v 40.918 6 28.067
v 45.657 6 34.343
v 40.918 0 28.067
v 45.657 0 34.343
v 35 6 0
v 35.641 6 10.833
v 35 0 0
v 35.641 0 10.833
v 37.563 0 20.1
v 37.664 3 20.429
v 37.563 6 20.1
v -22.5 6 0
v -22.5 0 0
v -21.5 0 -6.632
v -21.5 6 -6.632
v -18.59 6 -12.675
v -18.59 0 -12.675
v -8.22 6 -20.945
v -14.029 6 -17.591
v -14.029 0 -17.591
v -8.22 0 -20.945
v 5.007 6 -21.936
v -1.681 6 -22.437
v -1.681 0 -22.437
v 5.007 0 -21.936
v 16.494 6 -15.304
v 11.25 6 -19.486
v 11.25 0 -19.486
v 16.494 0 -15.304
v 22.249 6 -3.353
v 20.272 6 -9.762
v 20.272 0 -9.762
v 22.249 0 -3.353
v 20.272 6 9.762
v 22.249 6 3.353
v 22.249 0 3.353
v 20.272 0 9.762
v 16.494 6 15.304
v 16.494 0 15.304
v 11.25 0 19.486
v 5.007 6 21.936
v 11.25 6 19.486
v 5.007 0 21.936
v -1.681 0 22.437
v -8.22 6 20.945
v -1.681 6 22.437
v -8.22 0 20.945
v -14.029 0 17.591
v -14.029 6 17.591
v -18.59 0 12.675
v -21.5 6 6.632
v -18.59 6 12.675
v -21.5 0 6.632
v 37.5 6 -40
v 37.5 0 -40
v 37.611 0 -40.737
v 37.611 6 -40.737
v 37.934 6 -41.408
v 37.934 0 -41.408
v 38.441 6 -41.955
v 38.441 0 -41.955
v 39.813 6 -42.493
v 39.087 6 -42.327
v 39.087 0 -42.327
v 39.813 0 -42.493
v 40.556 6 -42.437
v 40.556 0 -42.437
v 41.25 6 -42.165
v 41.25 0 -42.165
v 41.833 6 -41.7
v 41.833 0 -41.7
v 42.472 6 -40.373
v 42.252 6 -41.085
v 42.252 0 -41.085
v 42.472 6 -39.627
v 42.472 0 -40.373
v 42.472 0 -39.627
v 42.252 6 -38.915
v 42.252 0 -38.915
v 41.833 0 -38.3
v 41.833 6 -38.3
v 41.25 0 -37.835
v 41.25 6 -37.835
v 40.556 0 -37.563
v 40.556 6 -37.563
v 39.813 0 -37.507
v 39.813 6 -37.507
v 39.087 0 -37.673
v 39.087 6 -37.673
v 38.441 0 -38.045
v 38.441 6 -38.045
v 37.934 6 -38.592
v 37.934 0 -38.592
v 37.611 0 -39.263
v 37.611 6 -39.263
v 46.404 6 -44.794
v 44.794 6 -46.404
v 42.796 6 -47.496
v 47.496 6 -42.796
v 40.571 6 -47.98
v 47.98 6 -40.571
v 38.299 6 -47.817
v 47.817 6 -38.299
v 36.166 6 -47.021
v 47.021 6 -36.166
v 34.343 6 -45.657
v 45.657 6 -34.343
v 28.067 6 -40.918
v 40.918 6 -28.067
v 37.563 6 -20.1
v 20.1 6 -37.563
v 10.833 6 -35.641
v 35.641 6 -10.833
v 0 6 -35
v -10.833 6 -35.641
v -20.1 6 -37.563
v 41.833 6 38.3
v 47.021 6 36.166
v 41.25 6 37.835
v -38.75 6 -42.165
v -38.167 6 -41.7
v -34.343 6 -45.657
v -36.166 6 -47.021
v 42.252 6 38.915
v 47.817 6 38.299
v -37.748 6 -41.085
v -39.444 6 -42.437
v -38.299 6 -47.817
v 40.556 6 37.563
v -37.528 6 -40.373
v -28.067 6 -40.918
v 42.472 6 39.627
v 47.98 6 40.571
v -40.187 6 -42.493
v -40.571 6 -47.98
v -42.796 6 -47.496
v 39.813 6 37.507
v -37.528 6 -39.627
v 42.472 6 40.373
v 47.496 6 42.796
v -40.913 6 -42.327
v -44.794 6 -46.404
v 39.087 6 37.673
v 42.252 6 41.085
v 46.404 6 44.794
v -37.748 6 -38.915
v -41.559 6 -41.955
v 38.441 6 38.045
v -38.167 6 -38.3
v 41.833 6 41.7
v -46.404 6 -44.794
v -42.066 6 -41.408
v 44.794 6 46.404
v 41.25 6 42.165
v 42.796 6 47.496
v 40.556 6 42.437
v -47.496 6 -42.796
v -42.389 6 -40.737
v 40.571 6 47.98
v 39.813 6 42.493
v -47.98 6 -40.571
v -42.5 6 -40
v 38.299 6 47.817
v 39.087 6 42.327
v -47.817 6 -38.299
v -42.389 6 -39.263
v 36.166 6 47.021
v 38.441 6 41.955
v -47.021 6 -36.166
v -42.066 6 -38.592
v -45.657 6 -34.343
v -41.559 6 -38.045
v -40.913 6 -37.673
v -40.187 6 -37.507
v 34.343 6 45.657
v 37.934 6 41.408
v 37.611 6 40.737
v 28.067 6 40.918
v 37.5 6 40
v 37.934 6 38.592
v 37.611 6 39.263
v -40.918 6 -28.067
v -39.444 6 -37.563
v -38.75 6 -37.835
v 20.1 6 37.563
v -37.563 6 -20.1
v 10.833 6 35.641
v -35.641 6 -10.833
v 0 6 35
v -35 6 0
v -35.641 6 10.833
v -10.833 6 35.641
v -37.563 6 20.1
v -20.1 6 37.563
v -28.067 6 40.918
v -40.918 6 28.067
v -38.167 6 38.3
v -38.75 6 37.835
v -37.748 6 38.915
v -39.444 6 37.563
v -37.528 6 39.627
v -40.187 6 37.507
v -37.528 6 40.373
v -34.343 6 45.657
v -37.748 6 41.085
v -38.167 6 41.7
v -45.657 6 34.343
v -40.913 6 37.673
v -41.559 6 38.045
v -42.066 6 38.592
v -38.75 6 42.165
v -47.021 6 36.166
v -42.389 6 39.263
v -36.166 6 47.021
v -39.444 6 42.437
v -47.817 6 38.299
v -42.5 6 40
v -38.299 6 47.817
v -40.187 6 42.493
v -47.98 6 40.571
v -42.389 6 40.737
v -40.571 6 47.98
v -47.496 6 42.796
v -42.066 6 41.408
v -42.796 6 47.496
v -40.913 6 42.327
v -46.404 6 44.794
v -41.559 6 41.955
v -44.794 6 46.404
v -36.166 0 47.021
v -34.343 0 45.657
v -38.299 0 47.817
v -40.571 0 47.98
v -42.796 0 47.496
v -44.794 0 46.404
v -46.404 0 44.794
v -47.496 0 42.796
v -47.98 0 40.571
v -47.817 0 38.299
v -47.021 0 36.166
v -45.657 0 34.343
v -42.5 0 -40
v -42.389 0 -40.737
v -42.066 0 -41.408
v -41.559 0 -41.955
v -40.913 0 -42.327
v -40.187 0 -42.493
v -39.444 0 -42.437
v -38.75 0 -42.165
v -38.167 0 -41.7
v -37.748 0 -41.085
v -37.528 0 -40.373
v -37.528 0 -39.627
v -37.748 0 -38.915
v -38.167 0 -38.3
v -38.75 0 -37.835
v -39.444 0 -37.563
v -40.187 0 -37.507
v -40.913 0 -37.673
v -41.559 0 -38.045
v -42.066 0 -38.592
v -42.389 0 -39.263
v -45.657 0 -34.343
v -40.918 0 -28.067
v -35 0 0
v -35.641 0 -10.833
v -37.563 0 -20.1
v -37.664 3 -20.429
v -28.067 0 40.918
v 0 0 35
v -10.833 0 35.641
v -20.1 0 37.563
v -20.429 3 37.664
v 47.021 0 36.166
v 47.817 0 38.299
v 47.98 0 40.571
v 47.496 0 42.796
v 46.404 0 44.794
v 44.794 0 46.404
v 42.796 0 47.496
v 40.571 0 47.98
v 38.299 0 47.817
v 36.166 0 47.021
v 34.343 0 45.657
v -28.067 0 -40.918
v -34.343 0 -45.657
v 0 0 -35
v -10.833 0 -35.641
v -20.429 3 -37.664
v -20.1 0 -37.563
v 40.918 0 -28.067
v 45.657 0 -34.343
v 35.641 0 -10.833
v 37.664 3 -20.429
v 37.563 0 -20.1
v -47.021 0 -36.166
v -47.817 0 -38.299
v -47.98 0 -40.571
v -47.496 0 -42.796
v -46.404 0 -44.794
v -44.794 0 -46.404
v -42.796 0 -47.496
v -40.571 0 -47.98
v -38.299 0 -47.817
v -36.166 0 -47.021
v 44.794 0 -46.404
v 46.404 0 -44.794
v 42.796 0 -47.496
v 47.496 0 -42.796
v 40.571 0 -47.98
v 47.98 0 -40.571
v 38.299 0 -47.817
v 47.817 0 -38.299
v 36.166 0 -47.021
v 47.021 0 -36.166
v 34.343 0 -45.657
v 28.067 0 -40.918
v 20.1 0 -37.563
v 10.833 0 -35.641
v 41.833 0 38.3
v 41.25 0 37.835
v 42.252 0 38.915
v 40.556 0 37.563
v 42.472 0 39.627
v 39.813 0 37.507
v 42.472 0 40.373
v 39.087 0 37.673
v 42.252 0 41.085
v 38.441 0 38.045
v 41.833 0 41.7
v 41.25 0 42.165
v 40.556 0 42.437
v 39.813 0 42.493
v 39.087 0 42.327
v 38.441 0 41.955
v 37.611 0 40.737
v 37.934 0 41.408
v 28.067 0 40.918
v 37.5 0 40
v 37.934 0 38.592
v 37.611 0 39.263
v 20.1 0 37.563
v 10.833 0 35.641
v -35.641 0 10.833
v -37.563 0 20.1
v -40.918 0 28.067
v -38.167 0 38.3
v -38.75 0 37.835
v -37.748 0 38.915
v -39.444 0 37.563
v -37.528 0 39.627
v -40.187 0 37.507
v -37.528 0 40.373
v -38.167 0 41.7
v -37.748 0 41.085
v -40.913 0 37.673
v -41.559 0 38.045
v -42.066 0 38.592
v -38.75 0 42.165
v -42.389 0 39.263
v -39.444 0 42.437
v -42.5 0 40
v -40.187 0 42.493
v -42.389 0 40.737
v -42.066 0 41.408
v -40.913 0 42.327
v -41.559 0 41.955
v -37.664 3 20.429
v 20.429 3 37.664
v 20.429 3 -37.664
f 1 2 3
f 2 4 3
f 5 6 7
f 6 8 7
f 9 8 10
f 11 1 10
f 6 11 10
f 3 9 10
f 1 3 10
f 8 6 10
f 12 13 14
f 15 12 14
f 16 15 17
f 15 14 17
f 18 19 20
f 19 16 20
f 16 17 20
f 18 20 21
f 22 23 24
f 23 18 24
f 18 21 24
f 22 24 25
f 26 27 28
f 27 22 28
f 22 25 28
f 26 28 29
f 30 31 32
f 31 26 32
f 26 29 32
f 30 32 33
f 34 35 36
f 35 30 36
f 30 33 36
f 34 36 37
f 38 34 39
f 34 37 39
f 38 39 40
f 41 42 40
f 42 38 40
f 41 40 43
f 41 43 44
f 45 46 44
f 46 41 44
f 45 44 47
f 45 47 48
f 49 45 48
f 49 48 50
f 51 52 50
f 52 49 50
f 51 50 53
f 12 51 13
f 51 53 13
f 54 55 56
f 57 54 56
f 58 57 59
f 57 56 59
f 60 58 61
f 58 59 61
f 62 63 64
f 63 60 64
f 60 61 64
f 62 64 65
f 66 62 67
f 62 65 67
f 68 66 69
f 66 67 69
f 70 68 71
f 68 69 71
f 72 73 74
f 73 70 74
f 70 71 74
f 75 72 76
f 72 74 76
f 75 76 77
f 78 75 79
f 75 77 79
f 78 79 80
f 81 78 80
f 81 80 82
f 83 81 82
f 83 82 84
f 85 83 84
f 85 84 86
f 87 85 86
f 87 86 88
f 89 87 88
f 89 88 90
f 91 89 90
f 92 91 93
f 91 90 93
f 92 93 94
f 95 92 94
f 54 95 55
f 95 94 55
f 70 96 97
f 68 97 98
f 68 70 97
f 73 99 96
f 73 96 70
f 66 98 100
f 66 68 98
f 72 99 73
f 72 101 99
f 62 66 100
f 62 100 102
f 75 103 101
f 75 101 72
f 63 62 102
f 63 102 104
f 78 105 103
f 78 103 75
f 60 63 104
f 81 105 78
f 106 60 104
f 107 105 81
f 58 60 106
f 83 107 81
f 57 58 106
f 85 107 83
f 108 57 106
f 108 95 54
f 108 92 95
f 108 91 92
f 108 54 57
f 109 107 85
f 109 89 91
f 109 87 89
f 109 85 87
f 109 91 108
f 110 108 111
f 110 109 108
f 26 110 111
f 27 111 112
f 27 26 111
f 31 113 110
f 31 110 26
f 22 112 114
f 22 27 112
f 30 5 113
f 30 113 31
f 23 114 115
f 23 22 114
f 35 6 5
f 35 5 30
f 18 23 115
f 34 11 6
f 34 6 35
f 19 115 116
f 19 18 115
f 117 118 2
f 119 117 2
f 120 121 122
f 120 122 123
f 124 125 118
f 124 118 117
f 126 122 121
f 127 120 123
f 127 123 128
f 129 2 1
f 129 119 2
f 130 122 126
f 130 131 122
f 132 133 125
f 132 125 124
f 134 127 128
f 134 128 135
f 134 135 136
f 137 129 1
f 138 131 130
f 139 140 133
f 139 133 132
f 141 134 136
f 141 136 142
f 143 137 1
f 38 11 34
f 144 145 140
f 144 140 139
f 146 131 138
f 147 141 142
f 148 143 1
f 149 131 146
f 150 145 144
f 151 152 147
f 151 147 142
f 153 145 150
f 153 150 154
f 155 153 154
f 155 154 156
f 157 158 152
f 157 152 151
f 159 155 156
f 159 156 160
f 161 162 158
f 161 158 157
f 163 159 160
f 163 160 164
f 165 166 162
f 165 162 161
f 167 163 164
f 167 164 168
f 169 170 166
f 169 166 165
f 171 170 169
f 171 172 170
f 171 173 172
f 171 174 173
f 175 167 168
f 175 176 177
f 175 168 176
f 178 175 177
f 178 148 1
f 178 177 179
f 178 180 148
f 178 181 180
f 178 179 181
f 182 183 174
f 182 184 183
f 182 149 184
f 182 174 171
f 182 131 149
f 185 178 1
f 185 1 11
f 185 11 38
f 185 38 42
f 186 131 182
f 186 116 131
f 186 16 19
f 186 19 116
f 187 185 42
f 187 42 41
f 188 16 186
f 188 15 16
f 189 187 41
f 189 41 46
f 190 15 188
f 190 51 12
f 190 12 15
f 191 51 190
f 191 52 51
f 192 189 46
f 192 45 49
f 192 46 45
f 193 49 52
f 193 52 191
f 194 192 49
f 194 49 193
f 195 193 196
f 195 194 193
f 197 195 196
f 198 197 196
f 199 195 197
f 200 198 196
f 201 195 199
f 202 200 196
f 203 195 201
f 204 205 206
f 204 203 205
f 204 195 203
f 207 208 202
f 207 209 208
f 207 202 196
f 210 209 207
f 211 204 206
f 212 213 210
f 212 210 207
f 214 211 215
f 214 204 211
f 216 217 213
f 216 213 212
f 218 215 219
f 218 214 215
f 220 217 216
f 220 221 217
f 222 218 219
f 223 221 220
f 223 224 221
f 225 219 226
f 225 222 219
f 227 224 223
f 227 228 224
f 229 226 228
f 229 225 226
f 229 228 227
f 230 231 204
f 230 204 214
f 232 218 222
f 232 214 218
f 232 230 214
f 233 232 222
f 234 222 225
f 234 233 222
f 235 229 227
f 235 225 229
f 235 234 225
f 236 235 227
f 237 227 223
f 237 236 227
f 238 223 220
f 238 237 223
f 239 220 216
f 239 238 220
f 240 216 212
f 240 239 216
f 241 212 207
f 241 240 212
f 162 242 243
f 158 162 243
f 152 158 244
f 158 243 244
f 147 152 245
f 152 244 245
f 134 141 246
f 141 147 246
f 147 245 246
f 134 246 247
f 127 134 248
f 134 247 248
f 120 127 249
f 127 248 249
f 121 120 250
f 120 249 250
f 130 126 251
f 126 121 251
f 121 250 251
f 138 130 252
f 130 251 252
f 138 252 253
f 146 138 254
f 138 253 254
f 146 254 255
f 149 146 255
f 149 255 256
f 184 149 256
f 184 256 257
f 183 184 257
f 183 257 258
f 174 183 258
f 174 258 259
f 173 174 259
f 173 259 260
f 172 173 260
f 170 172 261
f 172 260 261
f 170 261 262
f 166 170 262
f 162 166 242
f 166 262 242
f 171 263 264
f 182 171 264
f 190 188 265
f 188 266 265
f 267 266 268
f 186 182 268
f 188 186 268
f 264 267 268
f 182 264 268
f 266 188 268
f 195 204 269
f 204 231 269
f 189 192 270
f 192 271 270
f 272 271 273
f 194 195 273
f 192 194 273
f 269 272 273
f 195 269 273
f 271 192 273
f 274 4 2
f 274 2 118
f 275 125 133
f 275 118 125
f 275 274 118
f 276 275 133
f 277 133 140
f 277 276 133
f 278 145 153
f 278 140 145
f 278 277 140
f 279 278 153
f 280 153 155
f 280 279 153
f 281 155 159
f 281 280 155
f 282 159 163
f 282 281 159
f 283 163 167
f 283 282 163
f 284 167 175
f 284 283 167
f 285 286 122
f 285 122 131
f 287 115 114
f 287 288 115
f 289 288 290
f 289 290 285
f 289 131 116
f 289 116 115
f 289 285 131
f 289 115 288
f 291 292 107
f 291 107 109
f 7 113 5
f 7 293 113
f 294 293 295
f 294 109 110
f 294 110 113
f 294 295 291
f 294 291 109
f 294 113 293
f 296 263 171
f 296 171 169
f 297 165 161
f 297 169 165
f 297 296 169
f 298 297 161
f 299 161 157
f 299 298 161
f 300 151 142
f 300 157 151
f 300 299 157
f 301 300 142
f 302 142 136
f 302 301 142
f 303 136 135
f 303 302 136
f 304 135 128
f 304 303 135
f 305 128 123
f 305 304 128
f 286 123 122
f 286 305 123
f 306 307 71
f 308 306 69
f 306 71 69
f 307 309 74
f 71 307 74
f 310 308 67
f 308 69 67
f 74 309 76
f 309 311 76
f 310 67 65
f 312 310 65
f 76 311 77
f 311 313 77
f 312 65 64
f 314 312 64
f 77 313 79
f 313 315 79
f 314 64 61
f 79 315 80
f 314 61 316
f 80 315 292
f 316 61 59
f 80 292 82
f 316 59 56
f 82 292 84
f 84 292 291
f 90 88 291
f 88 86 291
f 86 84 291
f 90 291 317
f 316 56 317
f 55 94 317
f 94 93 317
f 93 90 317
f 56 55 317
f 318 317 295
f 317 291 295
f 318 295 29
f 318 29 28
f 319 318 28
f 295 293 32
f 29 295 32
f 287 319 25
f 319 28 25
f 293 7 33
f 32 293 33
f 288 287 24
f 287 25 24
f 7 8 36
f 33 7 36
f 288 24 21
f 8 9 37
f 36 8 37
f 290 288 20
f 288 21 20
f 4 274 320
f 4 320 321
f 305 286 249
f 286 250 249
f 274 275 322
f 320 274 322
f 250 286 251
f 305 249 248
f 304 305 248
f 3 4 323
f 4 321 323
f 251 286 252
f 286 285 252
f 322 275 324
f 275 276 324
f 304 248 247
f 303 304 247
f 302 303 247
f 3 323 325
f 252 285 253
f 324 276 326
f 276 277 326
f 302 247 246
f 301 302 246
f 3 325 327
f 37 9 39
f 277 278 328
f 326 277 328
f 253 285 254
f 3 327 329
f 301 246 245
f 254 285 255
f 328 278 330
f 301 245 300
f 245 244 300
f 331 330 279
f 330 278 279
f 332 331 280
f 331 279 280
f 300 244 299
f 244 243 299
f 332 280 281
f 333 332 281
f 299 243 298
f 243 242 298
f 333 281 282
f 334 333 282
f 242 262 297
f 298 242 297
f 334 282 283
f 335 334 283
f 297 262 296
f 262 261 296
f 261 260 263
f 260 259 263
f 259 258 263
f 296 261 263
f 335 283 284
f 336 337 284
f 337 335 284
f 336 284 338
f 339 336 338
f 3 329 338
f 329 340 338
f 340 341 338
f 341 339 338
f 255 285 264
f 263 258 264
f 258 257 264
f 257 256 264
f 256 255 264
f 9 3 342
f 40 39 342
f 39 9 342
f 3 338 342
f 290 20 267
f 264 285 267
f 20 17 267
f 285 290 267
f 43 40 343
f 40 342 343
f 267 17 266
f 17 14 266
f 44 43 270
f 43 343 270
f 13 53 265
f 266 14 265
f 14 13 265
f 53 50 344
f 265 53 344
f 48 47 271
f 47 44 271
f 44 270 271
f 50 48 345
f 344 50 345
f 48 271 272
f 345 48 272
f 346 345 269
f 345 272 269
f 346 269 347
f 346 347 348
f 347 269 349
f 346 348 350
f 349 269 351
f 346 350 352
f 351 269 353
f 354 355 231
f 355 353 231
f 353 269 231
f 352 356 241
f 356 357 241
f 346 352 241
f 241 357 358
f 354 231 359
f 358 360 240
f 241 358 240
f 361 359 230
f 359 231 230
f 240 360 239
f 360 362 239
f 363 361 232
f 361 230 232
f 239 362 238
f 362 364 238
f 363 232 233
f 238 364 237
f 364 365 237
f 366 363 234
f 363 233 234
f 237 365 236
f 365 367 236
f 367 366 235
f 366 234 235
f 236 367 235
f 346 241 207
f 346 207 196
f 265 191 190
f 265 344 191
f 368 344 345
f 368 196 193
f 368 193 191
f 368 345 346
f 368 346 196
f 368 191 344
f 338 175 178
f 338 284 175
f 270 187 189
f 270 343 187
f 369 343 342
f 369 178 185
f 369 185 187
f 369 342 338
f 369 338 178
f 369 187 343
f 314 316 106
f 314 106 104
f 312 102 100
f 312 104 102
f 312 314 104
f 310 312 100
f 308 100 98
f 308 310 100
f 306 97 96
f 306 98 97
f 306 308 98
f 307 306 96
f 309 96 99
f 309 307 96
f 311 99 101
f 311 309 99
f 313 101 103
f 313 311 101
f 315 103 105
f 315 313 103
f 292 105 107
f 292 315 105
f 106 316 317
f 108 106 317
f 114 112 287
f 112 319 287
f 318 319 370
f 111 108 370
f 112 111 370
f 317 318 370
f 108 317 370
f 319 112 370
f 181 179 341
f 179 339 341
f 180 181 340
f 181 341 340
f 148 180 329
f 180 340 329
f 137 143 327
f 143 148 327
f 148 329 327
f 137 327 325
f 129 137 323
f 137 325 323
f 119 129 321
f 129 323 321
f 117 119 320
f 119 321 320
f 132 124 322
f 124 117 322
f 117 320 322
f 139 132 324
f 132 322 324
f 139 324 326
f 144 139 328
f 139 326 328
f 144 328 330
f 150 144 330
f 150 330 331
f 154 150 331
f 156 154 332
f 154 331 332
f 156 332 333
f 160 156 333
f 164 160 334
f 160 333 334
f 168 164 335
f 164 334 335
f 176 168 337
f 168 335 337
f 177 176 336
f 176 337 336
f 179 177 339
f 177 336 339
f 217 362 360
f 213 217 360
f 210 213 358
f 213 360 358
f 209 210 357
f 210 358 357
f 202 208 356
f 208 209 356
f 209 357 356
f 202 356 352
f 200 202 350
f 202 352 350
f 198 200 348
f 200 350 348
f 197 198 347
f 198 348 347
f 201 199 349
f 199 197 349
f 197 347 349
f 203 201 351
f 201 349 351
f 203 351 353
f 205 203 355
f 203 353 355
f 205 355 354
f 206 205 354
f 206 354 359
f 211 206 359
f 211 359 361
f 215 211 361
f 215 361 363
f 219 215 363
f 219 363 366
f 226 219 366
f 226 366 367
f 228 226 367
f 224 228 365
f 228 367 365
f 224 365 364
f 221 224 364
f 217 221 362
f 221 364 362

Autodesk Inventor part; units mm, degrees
ref_plane "YZ Plane" through (0, 0, 0) normal (1, 0, 0) x (0, 1, 0)
ref_plane "XZ Plane" through (0, 0, 0) normal (0, 1, 0) x (-1, 0, 0)
ref_plane "XY Plane" through (0, 0, 0) normal (0, 0, 1) x (1, 0, 0)
sketch "Sketch1" plane through (0, 0, 0) normal (0, 1, 0) x (-1, 0, 0)
  line L0 (40, -40) -> (-40, -40) construction
  line L1 (-40, -40) -> (-40, 40) construction
  line L2 (-40, 40) -> (40, 40) construction
  line L3 (40, 40) -> (40, -40) construction
  line L4 (40, -40) -> (-40, 40) construction
  line L5 (-40, -40) -> (40, 40) construction
  circle A0 centre (-40, -40) radius 2.5
  arc A1 (-45.6569, -34.3431) -> (-34.3431, -45.6569) centre (-40, -40) ccw
  line L6 (-45.6569, -34.3431) -> (-35, -23.6863) construction
  line L7 (-35, -23.6863) -> (-35, 0) construction
  spline S0 degree 2 poles (-45.6569, -34.3431) (-35, -23.6863) (-35, 0) knots 1 1 1 2 2 2
  line L8 (-34.3431, -45.6569) -> (-45.6569, -34.3431) construction
  circle A2 centre (0, 0) radius 22.5
  line L9 (-34.3431, -45.6569) -> (-23.6863, -35) construction
  line L10 (-23.6863, -35) -> (0, -35) construction
  spline S1 degree 2 poles (-34.3431, -45.6569) (-23.6863, -35) (0, -35) knots 1 1 1 2 2 2
  line L11 (0, 0) -> (0, -47.3827) construction
  line L12 (0, 0) -> (-76.4691, 0) construction
  circle A3 centre (-40, 40) radius 2.5
  arc A4 (-34.3431, 45.6569) -> (-45.6569, 34.3431) centre (-40, 40) ccw
  line L13 (-45.6569, 34.3431) -> (-35, 23.6863) construction
  line L14 (-35, 23.6863) -> (-35, 0) construction
  spline S2 degree 2 poles (-45.6569, 34.3431) (-35, 23.6863) (-35, 0) knots 1 1 1 2 2 2
  spline S3 degree 2 poles (-34.3431, 45.6569) (-23.6863, 35) (0, 35) knots 1 1 1 2 2 2
  line L15 (-34.3431, 45.6569) -> (-23.6863, 35) construction
  line L16 (-23.6863, 35) -> (0, 35) construction
  circle A5 centre (40, -40) radius 2.5
  arc A6 (34.3431, -45.6569) -> (45.6569, -34.3431) centre (40, -40) ccw
  line L17 (45.6569, -34.3431) -> (35, -23.6863) construction
  line L18 (35, -23.6863) -> (35, 0) construction
  spline S4 degree 2 poles (45.6569, -34.3431) (35, -23.6863) (35, 0) knots 1 1 1 2 2 2
  spline S5 degree 2 poles (34.3431, -45.6569) (23.6863, -35) (0, -35) knots 1 1 1 2 2 2
  line L19 (34.3431, -45.6569) -> (23.6863, -35) construction
  line L20 (23.6863, -35) -> (0, -35) construction
  spline S6 degree 2 poles (45.6569, 34.3431) (35, 23.6863) (35, 0) knots 1 1 1 2 2 2
  arc A7 (45.6569, 34.3431) -> (34.3431, 45.6569) centre (40, 40) ccw
  circle A8 centre (40, 40) radius 2.5
  spline S7 degree 2 poles (34.3431, 45.6569) (23.6863, 35) (0, 35) knots 1 1 1 2 2 2
  line L21 (45.6569, 34.3431) -> (35, 23.6863) construction
  line L22 (35, 23.6863) -> (35, 0) construction
  line L23 (34.3431, 45.6569) -> (23.6863, 35) construction
  line L24 (23.6863, 35) -> (0, 35) construction
  dimension "d0" = 80
  dimension "d1" = 80
  dimension "d2" = 5
  dimension "d4" = 45
  dimension "d5" = 5
  dimension "d6" = 45
  dimension "d7" = 8
extrude "Extrusion1" add sketch "Sketch1" along normal blind 6
properties part number "YawBottomPlateThick"
